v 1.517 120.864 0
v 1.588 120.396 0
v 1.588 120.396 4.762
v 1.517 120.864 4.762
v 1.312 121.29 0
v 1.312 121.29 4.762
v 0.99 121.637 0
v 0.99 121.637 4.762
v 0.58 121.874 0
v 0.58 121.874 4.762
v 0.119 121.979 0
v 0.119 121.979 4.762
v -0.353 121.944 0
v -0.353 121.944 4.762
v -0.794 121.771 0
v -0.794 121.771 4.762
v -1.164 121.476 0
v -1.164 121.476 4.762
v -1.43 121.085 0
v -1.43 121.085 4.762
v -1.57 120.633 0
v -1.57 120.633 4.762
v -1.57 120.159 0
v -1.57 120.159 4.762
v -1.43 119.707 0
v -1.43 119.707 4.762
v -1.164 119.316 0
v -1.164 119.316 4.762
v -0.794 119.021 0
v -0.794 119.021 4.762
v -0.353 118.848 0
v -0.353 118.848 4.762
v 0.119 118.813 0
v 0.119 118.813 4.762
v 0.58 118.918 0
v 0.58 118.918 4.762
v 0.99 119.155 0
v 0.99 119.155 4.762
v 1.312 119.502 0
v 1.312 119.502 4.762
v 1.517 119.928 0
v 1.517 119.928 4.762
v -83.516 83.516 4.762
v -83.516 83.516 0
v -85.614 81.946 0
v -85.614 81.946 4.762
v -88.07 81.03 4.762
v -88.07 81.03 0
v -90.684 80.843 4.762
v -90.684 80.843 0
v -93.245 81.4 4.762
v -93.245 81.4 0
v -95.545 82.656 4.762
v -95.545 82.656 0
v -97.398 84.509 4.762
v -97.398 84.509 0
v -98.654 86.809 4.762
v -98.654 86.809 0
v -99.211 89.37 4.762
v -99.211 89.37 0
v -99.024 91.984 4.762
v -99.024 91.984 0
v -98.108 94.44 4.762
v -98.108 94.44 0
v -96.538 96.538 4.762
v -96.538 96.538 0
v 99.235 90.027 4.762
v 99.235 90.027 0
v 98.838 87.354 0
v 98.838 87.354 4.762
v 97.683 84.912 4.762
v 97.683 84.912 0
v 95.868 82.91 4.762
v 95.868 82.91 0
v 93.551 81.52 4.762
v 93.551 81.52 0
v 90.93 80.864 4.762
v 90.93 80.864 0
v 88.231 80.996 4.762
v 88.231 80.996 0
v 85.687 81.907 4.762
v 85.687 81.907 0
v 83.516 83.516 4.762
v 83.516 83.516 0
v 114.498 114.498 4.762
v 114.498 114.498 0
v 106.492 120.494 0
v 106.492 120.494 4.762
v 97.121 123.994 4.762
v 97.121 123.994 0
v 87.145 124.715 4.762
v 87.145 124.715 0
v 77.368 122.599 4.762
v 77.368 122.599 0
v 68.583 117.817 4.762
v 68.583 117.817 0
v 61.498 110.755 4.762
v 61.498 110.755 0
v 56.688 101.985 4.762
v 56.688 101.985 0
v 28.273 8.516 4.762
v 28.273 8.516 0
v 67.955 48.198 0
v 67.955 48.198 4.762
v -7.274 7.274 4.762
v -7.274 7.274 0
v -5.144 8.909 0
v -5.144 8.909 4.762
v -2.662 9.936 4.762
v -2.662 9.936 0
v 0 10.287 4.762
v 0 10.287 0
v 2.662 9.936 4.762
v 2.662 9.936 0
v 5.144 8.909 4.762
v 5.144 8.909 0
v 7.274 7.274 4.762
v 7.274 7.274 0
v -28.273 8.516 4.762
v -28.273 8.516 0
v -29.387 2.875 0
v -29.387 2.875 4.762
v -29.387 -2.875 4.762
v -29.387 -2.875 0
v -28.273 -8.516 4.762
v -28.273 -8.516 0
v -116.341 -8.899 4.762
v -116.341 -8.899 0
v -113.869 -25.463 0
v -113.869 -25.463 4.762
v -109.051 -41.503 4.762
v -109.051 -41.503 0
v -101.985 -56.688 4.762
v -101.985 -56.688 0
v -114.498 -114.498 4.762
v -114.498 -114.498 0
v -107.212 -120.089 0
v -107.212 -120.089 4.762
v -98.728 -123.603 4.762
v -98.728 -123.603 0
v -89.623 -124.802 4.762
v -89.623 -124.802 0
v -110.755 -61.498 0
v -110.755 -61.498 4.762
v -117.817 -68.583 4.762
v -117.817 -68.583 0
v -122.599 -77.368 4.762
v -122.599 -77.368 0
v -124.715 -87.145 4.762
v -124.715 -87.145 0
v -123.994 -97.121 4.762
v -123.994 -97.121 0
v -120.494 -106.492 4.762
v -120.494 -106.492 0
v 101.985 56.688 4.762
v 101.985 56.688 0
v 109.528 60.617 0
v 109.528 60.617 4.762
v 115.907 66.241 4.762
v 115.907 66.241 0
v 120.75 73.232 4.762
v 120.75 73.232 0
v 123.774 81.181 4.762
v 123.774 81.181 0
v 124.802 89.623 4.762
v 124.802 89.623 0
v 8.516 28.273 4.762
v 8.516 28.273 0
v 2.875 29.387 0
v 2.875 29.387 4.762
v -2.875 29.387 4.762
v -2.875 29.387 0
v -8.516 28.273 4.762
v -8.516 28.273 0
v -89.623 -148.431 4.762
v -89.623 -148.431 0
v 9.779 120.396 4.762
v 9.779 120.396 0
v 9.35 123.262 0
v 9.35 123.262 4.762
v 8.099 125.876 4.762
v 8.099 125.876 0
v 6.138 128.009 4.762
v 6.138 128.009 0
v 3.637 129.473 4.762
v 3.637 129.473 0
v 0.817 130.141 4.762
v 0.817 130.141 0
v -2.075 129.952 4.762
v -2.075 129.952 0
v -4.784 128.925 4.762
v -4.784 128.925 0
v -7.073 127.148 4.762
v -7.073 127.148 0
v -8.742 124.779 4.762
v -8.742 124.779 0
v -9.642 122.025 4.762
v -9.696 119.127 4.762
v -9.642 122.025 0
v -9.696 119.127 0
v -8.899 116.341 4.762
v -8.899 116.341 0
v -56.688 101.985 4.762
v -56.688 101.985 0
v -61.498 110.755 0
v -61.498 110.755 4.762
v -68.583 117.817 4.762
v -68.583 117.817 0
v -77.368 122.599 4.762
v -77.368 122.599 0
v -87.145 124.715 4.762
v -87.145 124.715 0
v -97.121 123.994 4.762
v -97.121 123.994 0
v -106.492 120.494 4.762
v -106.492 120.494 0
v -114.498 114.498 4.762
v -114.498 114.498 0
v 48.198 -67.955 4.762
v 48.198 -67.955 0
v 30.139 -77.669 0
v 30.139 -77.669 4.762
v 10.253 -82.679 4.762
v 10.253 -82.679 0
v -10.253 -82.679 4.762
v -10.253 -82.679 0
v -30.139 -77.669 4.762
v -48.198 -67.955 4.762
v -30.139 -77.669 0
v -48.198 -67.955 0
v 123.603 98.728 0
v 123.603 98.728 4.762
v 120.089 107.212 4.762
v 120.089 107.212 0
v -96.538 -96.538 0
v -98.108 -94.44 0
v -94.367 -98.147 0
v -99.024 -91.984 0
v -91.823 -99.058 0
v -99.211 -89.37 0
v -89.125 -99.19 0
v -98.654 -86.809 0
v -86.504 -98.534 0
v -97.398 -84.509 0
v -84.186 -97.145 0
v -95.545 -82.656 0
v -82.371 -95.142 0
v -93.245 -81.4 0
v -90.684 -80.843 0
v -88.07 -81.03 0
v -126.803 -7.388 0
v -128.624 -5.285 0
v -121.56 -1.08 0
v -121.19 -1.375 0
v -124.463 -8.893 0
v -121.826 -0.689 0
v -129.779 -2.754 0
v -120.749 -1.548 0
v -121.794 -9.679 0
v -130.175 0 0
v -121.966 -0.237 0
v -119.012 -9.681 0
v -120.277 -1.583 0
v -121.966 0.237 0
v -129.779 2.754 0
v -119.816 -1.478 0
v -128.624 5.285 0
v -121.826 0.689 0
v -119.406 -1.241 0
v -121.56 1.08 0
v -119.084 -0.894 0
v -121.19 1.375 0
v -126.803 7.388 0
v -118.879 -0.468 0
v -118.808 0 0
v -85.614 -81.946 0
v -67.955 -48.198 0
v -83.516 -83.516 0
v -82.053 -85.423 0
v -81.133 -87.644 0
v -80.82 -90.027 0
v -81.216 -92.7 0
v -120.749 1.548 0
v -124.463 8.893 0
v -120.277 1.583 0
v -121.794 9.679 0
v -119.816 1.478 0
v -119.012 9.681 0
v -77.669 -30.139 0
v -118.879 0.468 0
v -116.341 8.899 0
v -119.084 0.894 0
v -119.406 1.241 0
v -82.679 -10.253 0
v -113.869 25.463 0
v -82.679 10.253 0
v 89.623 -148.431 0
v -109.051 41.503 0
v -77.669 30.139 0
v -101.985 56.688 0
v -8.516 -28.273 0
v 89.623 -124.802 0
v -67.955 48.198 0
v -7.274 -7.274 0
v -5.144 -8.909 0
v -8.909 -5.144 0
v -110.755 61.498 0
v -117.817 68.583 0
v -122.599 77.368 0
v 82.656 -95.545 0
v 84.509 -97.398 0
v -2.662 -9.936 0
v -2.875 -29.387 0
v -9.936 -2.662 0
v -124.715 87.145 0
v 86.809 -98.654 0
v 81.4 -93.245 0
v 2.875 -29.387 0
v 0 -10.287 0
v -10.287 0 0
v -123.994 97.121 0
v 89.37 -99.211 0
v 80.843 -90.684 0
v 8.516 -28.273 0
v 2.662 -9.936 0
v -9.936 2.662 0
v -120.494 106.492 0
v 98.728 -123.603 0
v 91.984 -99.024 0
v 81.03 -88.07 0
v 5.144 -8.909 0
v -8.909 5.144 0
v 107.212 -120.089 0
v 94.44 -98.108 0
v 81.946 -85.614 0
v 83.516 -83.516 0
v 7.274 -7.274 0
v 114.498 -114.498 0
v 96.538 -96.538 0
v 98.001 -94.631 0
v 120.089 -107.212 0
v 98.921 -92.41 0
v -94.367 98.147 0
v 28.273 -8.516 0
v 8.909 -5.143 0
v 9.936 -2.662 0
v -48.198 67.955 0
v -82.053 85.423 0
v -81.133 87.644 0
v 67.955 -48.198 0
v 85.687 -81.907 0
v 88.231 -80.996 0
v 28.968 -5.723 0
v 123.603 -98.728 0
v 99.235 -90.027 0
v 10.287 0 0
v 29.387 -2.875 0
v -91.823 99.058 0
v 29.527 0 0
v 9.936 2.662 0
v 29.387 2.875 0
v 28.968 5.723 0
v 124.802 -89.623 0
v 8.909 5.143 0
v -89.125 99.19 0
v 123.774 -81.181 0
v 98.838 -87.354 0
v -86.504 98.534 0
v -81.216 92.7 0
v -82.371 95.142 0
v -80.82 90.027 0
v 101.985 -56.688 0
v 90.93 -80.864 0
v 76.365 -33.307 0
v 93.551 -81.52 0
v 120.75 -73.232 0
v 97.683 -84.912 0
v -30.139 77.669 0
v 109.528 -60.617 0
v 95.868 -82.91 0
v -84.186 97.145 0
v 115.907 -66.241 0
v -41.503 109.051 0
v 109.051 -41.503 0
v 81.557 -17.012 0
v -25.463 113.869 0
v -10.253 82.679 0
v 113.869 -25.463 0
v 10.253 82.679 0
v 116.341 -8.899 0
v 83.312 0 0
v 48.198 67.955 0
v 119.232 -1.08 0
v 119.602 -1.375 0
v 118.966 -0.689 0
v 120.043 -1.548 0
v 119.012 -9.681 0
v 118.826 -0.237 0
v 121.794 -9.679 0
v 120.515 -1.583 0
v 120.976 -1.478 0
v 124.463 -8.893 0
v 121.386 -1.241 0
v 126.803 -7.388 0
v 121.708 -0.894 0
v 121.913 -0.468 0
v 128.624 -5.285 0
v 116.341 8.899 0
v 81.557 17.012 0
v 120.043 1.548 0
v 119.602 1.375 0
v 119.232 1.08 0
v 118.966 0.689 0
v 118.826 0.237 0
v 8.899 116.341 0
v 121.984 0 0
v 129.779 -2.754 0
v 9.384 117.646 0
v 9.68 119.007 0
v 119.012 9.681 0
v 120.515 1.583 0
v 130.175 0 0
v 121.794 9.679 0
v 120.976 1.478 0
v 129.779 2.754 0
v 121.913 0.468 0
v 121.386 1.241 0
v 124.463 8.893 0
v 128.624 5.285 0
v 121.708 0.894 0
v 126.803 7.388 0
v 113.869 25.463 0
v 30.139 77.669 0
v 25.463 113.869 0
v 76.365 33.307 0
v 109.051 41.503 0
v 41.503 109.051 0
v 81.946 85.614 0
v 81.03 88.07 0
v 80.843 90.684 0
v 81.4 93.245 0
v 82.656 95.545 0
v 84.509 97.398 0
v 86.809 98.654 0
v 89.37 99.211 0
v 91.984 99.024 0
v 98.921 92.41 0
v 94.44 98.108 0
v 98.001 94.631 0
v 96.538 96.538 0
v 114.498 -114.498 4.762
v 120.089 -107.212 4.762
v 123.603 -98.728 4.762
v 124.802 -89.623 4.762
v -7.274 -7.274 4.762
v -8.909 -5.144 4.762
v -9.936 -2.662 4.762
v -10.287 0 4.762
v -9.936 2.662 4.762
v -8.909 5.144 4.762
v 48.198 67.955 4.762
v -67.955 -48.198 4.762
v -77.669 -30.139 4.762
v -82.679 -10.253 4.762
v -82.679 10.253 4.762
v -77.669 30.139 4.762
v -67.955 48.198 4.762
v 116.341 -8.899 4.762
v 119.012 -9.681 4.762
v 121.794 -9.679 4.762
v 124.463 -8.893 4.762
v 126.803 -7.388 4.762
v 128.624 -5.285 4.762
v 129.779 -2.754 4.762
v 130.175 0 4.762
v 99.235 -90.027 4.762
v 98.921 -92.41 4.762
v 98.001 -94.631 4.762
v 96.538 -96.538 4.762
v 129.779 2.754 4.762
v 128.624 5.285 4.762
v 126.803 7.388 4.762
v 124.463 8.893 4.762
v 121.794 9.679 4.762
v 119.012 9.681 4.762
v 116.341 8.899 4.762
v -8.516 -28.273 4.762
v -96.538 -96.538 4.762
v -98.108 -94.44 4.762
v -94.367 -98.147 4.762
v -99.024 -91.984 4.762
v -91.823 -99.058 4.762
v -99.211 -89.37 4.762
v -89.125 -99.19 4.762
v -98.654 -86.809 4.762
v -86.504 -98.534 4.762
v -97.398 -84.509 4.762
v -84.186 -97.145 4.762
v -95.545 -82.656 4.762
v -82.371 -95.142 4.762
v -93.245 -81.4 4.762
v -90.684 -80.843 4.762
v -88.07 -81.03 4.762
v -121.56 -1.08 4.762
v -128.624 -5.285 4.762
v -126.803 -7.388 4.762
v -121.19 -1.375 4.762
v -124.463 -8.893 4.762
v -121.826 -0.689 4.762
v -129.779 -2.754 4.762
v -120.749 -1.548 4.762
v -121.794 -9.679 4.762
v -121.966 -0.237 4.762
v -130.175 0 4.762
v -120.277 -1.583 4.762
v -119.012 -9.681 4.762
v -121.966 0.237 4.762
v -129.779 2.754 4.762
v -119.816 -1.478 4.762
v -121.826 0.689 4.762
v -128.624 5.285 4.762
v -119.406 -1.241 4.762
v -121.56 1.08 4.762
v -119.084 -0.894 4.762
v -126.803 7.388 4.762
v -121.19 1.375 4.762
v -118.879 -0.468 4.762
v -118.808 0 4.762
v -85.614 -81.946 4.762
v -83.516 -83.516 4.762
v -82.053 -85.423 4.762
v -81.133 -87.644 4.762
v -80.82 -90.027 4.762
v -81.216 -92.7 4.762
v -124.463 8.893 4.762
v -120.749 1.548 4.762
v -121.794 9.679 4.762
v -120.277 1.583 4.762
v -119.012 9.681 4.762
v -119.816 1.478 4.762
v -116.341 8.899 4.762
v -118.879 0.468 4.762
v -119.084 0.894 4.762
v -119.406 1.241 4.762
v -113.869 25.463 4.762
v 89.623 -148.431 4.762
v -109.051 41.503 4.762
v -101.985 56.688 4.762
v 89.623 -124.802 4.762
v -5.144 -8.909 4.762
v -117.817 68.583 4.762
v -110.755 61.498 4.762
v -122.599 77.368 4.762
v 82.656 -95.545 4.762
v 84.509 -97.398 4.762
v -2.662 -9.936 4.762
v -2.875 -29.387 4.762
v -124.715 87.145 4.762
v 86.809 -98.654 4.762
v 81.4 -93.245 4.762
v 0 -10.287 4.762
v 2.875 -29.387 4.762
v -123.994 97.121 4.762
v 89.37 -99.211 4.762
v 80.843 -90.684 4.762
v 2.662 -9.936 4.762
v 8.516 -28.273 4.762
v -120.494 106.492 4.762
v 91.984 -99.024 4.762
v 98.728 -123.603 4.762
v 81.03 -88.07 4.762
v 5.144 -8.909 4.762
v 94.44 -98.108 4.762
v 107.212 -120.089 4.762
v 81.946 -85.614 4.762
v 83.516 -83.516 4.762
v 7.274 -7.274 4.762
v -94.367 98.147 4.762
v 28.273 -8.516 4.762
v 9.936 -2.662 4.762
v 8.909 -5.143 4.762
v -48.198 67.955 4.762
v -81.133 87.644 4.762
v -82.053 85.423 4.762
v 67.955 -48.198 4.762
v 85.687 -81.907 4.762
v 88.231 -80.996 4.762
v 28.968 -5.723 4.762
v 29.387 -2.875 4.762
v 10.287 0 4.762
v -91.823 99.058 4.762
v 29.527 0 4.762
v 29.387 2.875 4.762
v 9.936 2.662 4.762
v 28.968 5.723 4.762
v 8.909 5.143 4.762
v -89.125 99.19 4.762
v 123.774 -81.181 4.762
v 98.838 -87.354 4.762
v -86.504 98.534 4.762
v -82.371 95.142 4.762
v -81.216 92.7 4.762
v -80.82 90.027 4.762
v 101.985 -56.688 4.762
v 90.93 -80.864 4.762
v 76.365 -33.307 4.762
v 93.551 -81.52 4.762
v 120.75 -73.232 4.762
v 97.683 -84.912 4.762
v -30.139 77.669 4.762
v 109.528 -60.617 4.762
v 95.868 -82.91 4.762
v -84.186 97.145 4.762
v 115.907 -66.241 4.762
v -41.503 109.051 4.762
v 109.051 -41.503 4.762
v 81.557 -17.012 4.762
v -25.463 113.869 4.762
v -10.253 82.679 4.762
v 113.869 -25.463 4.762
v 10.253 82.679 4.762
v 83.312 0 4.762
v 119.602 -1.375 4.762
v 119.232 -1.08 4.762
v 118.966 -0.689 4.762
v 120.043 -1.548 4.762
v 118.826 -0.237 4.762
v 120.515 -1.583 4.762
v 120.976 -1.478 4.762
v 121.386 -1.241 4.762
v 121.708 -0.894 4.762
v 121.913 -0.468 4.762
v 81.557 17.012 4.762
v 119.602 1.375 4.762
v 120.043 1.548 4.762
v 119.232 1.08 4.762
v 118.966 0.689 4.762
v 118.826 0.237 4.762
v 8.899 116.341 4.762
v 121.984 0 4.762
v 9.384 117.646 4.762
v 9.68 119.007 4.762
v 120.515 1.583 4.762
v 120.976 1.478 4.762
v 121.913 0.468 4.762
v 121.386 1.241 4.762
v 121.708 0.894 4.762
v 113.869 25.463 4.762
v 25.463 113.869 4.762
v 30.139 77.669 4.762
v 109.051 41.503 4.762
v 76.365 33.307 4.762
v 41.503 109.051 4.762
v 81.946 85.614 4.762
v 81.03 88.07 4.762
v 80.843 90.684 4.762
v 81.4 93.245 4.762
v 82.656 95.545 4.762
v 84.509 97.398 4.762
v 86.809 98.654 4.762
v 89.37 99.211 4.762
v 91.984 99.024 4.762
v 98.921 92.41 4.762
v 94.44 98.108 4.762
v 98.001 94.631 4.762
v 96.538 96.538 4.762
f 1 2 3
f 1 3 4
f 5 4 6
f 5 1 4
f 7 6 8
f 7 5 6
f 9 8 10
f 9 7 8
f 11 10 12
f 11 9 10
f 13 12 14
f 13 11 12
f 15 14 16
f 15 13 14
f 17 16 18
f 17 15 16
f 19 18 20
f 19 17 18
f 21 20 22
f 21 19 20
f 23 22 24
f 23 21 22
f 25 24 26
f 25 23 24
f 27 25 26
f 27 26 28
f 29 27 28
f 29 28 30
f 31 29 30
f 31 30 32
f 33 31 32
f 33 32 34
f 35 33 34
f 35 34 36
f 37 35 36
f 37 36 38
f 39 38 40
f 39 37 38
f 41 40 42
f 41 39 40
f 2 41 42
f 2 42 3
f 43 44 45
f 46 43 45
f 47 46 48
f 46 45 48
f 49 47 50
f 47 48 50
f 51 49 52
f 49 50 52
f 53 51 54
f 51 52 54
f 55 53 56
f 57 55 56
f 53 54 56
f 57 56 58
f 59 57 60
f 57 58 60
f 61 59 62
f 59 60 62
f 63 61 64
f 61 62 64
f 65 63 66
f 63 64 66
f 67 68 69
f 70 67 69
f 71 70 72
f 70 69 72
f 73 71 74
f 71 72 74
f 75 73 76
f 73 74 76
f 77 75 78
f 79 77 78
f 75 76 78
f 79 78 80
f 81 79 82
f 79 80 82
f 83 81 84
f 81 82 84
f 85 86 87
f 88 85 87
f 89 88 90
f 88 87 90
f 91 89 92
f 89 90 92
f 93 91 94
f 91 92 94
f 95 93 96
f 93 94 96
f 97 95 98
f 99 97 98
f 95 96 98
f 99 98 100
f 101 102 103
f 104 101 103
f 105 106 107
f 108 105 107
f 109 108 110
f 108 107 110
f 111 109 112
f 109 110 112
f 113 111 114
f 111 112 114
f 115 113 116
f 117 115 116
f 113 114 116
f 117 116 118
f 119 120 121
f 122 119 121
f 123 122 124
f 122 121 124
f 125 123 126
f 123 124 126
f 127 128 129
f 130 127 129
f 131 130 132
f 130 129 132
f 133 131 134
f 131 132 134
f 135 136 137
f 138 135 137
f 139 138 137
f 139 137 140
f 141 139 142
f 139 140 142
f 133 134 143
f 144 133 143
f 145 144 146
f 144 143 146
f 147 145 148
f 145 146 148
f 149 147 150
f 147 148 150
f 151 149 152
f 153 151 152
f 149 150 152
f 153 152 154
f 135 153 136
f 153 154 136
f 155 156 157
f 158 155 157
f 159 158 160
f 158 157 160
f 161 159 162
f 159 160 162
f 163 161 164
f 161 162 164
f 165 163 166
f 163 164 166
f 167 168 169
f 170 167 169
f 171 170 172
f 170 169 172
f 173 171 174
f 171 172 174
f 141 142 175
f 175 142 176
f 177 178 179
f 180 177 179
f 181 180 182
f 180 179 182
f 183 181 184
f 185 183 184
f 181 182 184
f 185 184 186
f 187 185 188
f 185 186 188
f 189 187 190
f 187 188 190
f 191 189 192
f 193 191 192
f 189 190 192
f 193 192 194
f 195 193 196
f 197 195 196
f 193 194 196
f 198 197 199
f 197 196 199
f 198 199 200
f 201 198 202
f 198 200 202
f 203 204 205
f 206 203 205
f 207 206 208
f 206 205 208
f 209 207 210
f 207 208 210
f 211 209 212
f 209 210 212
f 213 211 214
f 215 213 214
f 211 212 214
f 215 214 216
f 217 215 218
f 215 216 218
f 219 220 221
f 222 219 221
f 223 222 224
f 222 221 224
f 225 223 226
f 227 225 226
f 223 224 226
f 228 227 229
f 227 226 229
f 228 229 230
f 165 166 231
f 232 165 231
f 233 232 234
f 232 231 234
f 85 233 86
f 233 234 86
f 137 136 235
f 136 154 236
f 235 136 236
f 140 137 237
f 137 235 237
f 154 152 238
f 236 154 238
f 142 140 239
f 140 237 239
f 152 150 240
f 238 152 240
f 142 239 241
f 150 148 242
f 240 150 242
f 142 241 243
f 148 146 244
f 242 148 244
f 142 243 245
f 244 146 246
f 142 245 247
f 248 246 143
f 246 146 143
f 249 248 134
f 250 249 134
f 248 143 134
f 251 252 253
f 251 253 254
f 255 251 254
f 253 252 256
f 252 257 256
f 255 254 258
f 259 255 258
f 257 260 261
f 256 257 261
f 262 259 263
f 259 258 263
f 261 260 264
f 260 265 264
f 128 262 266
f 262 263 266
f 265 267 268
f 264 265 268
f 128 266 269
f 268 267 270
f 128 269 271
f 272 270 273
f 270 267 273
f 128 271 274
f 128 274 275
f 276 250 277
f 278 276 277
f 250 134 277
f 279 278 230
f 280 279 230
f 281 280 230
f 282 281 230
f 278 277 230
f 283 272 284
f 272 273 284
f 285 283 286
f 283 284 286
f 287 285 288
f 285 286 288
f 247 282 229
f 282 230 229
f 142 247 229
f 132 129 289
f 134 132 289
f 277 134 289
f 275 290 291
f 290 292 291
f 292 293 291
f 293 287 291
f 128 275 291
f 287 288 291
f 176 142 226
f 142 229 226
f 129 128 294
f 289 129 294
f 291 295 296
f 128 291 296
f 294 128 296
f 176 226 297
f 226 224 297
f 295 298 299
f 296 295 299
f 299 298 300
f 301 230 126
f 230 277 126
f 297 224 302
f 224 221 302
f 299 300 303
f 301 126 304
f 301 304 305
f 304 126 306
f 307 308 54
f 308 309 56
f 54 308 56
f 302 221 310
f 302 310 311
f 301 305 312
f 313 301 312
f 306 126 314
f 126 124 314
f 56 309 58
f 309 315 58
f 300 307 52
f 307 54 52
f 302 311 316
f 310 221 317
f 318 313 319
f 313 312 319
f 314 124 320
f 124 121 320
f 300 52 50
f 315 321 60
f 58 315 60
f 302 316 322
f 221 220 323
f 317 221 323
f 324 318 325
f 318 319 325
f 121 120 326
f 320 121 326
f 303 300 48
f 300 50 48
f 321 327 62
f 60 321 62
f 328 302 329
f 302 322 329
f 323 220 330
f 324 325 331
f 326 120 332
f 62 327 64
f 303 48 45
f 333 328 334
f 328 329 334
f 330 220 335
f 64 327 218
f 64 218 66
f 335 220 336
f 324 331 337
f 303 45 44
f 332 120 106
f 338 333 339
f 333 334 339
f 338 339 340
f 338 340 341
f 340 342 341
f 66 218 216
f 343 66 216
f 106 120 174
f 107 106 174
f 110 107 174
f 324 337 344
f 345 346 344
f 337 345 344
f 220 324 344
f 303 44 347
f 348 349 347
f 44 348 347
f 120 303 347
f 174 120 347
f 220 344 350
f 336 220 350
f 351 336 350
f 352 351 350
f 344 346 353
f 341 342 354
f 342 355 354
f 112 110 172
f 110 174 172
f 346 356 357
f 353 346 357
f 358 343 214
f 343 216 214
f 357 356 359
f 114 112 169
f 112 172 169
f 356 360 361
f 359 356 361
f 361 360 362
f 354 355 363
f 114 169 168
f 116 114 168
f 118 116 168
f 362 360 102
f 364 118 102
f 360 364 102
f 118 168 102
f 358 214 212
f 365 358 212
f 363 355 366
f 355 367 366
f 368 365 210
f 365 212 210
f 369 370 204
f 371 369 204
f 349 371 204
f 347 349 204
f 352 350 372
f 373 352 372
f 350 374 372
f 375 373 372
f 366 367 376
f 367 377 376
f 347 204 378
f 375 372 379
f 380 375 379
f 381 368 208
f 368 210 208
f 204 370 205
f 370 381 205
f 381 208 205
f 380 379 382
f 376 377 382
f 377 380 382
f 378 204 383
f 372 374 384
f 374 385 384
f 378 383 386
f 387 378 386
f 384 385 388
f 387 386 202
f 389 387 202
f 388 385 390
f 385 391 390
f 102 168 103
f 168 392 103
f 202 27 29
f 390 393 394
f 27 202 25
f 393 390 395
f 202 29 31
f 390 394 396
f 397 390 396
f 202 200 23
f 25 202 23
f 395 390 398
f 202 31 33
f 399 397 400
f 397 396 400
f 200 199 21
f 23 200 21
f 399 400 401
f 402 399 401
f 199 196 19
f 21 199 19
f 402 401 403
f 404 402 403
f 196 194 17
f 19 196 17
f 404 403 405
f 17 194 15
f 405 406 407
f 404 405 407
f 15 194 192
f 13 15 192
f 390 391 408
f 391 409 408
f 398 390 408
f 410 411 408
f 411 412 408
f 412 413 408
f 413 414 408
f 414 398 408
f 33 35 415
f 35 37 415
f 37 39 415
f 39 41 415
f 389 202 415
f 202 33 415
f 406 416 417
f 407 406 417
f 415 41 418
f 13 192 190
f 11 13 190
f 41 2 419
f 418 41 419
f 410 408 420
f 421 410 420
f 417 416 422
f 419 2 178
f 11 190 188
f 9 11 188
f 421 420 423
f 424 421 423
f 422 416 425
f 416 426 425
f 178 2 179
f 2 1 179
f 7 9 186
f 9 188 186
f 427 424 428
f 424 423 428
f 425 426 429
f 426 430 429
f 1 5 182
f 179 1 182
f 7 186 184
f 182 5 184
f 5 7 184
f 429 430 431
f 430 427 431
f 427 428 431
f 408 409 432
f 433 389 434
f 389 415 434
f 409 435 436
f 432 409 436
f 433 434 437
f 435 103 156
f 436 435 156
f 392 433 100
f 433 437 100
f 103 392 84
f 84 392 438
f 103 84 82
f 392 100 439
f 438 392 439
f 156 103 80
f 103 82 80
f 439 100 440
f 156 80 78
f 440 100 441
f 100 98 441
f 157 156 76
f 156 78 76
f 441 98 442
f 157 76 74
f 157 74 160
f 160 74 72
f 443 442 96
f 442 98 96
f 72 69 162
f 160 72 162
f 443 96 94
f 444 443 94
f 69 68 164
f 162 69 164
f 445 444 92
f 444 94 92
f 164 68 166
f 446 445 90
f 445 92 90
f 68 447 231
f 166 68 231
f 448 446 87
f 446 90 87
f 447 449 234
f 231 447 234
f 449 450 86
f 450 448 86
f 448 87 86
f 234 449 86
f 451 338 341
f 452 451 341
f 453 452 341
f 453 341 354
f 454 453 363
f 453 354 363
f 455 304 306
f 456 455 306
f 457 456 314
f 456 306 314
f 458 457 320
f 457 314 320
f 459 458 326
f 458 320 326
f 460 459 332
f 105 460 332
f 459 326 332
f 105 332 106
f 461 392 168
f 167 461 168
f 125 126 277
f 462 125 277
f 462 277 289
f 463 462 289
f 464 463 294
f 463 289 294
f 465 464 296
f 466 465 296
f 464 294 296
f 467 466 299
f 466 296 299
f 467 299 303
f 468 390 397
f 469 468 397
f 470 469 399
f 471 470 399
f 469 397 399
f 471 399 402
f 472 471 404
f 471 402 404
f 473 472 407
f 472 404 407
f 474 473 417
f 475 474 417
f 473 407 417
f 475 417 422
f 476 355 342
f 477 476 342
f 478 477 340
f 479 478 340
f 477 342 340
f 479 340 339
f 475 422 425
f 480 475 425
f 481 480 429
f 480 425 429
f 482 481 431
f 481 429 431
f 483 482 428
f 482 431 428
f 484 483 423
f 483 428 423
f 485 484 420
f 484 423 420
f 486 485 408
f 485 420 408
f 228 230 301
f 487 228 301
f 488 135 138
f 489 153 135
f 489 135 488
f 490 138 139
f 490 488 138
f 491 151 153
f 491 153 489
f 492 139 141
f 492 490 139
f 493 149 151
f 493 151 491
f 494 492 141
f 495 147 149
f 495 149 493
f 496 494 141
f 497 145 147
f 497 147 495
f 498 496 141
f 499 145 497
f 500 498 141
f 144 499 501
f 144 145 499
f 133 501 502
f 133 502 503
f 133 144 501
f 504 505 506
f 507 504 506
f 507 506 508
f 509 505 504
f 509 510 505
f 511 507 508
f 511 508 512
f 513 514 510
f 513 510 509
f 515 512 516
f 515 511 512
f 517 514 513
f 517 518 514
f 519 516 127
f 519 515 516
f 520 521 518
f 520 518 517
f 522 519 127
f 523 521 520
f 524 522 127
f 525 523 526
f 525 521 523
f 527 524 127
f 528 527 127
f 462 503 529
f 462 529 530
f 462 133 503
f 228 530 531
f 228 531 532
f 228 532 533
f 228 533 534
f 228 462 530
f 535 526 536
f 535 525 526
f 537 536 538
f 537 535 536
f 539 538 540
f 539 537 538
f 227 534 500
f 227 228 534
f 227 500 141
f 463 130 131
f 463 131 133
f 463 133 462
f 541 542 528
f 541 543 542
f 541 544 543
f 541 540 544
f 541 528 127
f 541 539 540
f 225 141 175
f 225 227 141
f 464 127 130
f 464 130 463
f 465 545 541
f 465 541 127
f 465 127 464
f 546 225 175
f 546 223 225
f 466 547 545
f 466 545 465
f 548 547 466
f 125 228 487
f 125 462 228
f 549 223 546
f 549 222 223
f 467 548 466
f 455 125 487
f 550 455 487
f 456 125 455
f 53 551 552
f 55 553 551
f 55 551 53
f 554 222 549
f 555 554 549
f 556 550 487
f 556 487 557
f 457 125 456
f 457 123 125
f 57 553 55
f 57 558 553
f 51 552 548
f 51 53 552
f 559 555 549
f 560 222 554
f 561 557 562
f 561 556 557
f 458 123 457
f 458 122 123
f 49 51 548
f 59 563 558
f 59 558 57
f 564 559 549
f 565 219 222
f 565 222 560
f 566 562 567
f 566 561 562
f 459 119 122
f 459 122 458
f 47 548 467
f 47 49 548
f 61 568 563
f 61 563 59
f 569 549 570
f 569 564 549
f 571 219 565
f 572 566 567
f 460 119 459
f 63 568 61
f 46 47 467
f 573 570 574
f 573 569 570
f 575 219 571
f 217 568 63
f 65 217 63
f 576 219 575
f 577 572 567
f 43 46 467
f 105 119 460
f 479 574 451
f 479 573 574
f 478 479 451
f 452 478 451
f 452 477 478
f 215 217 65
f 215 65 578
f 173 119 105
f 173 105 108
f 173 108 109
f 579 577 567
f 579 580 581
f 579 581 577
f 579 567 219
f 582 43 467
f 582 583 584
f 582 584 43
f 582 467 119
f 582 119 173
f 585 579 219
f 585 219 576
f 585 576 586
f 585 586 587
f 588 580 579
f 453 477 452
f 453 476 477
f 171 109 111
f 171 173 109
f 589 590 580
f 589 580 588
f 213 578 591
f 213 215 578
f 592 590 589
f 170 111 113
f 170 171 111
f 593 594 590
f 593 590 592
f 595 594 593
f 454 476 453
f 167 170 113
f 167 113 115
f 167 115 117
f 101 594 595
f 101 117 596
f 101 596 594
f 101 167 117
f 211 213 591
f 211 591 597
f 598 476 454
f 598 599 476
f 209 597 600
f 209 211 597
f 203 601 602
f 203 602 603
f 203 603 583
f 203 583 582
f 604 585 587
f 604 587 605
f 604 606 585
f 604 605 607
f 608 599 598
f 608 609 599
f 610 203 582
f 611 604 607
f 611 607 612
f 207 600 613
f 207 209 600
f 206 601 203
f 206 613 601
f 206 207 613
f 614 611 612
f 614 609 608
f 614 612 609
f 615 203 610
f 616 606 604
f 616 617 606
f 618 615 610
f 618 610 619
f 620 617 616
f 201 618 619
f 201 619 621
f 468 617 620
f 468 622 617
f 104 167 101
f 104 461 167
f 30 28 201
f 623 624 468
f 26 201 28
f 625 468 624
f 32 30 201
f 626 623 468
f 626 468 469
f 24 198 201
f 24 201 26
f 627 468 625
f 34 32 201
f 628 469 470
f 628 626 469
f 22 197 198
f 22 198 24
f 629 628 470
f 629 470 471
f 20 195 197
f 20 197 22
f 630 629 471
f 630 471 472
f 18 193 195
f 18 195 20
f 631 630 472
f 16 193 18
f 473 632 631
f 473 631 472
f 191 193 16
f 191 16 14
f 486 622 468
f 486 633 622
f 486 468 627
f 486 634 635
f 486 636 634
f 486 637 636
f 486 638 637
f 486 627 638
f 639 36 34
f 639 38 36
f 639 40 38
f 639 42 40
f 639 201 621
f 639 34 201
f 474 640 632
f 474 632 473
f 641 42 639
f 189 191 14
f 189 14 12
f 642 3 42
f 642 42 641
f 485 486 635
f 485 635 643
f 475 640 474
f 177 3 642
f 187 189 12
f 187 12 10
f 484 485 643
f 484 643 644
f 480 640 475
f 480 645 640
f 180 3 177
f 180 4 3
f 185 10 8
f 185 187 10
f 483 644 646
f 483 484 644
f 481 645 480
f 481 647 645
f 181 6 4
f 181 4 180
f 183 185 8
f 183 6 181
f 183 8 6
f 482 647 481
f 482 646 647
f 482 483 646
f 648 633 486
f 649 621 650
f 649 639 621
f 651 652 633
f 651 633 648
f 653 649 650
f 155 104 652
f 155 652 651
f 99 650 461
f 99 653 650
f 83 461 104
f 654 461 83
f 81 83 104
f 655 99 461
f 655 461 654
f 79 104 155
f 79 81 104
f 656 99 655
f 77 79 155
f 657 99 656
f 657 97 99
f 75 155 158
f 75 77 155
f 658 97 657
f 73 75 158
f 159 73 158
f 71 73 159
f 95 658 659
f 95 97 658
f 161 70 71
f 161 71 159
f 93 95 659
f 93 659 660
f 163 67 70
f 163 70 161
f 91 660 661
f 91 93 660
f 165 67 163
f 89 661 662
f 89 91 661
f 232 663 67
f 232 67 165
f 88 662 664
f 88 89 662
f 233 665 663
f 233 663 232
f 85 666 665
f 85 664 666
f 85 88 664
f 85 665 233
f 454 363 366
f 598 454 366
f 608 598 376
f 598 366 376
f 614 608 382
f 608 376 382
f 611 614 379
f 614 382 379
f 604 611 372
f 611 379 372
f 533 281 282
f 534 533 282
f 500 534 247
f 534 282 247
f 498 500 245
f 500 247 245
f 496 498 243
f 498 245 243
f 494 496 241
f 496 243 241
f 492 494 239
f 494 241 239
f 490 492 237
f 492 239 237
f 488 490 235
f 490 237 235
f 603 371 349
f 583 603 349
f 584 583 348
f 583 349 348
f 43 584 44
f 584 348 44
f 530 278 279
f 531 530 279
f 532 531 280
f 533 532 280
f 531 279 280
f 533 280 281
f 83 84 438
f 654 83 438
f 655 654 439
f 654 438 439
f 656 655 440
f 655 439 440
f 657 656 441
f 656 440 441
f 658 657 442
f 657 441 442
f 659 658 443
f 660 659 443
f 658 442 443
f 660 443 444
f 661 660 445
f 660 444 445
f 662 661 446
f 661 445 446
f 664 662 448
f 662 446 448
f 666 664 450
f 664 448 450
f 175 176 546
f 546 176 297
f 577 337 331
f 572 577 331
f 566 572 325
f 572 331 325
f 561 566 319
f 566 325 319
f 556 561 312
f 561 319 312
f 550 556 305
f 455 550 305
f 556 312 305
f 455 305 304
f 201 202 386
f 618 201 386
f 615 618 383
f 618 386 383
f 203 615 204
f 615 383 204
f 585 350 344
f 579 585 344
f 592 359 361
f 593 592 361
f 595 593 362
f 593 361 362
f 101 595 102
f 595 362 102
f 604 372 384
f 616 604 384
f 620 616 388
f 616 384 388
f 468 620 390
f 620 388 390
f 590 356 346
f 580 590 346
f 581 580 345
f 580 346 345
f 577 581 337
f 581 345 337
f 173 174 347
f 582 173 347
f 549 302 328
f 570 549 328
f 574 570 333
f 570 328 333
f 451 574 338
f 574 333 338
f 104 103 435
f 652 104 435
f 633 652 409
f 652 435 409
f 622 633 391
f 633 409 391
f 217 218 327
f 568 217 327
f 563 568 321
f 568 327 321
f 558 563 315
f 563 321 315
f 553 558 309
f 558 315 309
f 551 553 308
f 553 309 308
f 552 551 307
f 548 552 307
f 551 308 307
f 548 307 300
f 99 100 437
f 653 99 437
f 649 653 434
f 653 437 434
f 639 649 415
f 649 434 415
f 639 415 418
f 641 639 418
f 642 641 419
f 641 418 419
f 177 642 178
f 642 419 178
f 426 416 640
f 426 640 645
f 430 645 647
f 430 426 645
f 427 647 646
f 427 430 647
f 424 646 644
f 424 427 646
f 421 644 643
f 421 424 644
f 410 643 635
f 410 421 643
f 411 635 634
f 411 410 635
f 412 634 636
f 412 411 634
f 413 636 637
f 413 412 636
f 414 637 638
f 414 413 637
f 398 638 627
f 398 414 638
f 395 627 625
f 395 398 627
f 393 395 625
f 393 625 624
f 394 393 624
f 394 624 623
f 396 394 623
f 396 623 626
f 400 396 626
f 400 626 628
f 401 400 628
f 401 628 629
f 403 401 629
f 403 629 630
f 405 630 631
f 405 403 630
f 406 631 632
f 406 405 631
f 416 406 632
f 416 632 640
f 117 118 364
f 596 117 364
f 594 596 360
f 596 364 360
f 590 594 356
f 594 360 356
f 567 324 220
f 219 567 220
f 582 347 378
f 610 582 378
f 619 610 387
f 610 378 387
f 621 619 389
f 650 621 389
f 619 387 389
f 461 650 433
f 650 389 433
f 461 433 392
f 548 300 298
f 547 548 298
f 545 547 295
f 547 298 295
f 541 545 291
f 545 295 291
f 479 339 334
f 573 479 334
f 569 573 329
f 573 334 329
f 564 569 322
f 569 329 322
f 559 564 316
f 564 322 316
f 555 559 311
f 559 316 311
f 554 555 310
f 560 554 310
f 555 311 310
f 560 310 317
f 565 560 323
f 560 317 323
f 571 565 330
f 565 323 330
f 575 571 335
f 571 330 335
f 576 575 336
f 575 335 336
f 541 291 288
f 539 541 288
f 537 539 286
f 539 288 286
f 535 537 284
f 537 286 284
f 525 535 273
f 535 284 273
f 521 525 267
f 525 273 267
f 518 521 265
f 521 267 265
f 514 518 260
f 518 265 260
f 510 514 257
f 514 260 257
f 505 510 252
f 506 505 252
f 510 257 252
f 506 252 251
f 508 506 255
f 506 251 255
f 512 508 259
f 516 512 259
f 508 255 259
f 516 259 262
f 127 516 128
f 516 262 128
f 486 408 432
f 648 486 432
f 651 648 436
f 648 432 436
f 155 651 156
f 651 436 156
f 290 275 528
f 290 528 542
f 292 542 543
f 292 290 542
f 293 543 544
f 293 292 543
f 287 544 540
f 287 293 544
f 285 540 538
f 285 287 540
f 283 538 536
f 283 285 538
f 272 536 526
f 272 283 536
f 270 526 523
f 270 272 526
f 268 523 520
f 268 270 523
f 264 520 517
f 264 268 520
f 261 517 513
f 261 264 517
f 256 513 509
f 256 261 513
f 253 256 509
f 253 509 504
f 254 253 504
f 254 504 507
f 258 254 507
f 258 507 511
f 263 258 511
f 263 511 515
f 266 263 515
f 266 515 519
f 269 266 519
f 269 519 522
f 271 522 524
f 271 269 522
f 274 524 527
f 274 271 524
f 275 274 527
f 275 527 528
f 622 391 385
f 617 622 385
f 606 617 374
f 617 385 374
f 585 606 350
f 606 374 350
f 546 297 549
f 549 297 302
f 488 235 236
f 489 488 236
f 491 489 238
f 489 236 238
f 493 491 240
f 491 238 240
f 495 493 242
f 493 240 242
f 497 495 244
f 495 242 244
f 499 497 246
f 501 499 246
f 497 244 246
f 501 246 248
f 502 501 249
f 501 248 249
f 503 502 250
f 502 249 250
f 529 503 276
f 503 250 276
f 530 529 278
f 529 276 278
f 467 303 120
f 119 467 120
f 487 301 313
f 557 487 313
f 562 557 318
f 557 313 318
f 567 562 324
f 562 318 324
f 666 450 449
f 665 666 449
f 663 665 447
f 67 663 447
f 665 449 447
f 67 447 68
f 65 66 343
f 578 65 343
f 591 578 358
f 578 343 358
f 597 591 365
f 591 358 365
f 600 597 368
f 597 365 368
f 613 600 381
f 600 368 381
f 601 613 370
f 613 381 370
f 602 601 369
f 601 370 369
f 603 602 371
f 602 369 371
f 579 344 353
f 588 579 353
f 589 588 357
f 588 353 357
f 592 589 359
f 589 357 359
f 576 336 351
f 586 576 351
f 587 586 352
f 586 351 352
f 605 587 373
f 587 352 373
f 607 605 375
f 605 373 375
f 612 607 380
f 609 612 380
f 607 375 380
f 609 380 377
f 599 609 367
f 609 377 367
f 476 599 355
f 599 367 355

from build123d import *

# Parameters (mm, degrees)
F0_R     = 1.5875
F1_DEPTH = 4.7625


# Not quite as in the source:
# - a length typed as a fraction of an inch, garbled in the dataset ("3 / 203.2 mm" for 3/8 in), is restored


with BuildPart() as f1:
    # F0 (on Top) → F1 (new body)
    with BuildSketch(Plane.XY):
        with BuildLine():
            ThreePointArc((-101.9853941355, 56.6876837116), (-93.1446500572, 70.2750899486), (-82.5061031123, 82.5061031123))
            Line((-82.5061031123, 82.5061031123), (-83.5163819259, 83.5163819259))
            ThreePointArc((-83.5163819259, 83.5163819259), (-96.5377533015, 83.5163819259), (-96.5377533015, 96.5377533015))
            Line((-96.5377533015, 96.5377533015), (-114.4982655436, 114.4982655436))
            ThreePointArc((-114.4982655436, 114.4982655436), (-124.0057759655, 82.180930941), (-101.9853941355, 56.6876837116))
        make_face()
        with BuildLine():
            ThreePointArc((-82.5061031123, 82.5061031123), (-70.2750899486, 93.1446500572), (-56.6876837116, 101.9853941355))
            ThreePointArc((-56.6876837116, 101.9853941355), (-82.180930941, 124.0057759655), (-114.4982655436, 114.4982655436))
            Line((-114.4982655436, 114.4982655436), (-96.5377533015, 96.5377533015))
            ThreePointArc((-96.5377533015, 96.5377533015), (-86.5035099102, 98.5336884093), (-80.8195676137, 90.0270676137))
            ThreePointArc((-80.8195676137, 90.0270676137), (-81.5204468181, 86.5035099102), (-83.5163819259, 83.5163819259))
            Line((-83.5163819259, 83.5163819259), (-82.5061031123, 82.5061031123))
        make_face()
        with BuildLine():
            ThreePointArc((-54.4439560883, 89.6229560883), (-55.0094328066, 95.9051568993), (-56.6876837116, 101.9853941355))
            ThreePointArc((-56.6876837116, 101.9853941355), (-70.2750899486, 93.1446500572), (-82.5061031123, 82.5061031123))
            Line((-82.5061031123, 82.5061031123), (-64.7476466329, 64.7476466329))
            ThreePointArc((-64.7476466329, 64.7476466329), (-57.1217980141, 76.1605356211), (-54.4439560883, 89.6229560883))
        make_face()
        with BuildLine():
            Line((-64.7476466329, 64.7476466329), (-82.5061031123, 82.5061031123))
            ThreePointArc((-82.5061031123, 82.5061031123), (-93.1446500572, 70.2750899486), (-101.9853941355, 56.6876837116))
            ThreePointArc((-101.9853941355, 56.6876837116), (-82.180930941, 55.2401362111), (-64.7476466329, 64.7476466329))
        make_face()
        with BuildLine():
            ThreePointArc((-67.954647167, 48.1980837006), (-63.6582986892, 53.7448634941), (-58.9104801542, 58.9104801542))
            Line((-58.9104801542, 58.9104801542), (-64.7476466329, 64.7476466329))
            ThreePointArc((-64.7476466329, 64.7476466329), (-82.180930941, 55.2401362111), (-101.9853941355, 56.6876837116))
            ThreePointArc((-101.9853941355, 56.6876837116), (-111.7478973152, 33.5696521758), (-116.3414153151, 8.8988304868))
            ThreePointArc((-116.3414153151, 8.8988304868), (-112.1716877299, 5.2905130832), (-110.617, 0))
            ThreePointArc((-110.617, 0), (-112.1716877299, -5.2905130832), (-116.3414153151, -8.8988304868))
            ThreePointArc((-116.3414153151, -8.8988304868), (-111.7478973152, -33.5696521758), (-101.9853941355, -56.6876837116))
            ThreePointArc((-101.9853941355, -56.6876837116), (-82.180930941, -55.2401362111), (-64.7476466329, -64.7476466329))
            Line((-64.7476466329, -64.7476466329), (-58.9104801542, -58.9104801542))
            ThreePointArc((-58.9104801542, -58.9104801542), (-63.6582986892, -53.7448634941), (-67.954647167, -48.1980837006))
            ThreePointArc((-67.954647167, -48.1980837006), (-83.312, 0), (-67.954647167, 48.1980837006))
        make_face()
        with BuildLine():
            Line((58.9104801542, 58.9104801542), (64.7476466329, 64.7476466329))
            ThreePointArc((64.7476466329, 64.7476466329), (55.2401362111, 82.180930941), (56.6876837116, 101.9853941355))
            ThreePointArc((56.6876837116, 101.9853941355), (33.5696521758, 111.7478973152), (8.8988304868, 116.3414153151))
            ThreePointArc((8.8988304868, 116.3414153151), (0, 110.617), (-8.8988304868, 116.3414153151))
            ThreePointArc((-8.8988304868, 116.3414153151), (-33.5696521758, 111.7478973152), (-56.6876837116, 101.9853941355))
            ThreePointArc((-56.6876837116, 101.9853941355), (-55.0094328066, 95.9051568993), (-54.4439560883, 89.6229560883))
            ThreePointArc((-54.4439560883, 89.6229560883), (-57.1217980141, 76.1605356211), (-64.7476466329, 64.7476466329))
            Line((-64.7476466329, 64.7476466329), (-58.9104801542, 58.9104801542))
            ThreePointArc((-58.9104801542, 58.9104801542), (-53.7448634941, 63.6582986892), (-48.1980837006, 67.954647167))
            ThreePointArc((-48.1980837006, 67.954647167), (0, 83.312), (48.1980837006, 67.954647167))
            ThreePointArc((48.1980837006, 67.954647167), (53.7448634941, 63.6582986892), (58.9104801542, 58.9104801542))
        make_face()
        with BuildLine():
            ThreePointArc((116.3414153151, -8.8988304868), (110.617, 0), (116.3414153151, 8.8988304868))
            ThreePointArc((116.3414153151, 8.8988304868), (111.7478973152, 33.5696521758), (101.9853941355, 56.6876837116))
            ThreePointArc((101.9853941355, 56.6876837116), (82.180930941, 55.2401362111), (64.7476466329, 64.7476466329))
            Line((64.7476466329, 64.7476466329), (58.9104801542, 58.9104801542))
            ThreePointArc((58.9104801542, 58.9104801542), (63.6582986892, 53.7448634941), (67.954647167, 48.1980837006))
            ThreePointArc((67.954647167, 48.1980837006), (79.3798680673, 25.2928031189), (83.312, 0))
            ThreePointArc((83.312, 0), (79.3798680673, -25.2928031189), (67.954647167, -48.1980837006))
            ThreePointArc((67.954647167, -48.1980837006), (63.6582986892, -53.7448634941), (58.9104801542, -58.9104801542))
            Line((58.9104801542, -58.9104801542), (64.7476466329, -64.7476466329))
            ThreePointArc((64.7476466329, -64.7476466329), (82.180930941, -55.2401362111), (101.9853941355, -56.6876837116))
            ThreePointArc((101.9853941355, -56.6876837116), (111.7478973152, -33.5696521758), (116.3414153151, -8.8988304868))
        make_face()
        with BuildLine():
            ThreePointArc((56.6876837116, -101.9853941355), (55.2401362111, -82.180930941), (64.7476466329, -64.7476466329))
            Line((64.7476466329, -64.7476466329), (58.9104801542, -58.9104801542))
            ThreePointArc((58.9104801542, -58.9104801542), (53.7448634941, -63.6582986892), (48.1980837006, -67.954647167))
            ThreePointArc((48.1980837006, -67.954647167), (0, -83.312), (-48.1980837006, -67.954647167))
            ThreePointArc((-48.1980837006, -67.954647167), (-53.7448634941, -63.6582986892), (-58.9104801542, -58.9104801542))
            Line((-58.9104801542, -58.9104801542), (-64.7476466329, -64.7476466329))
            ThreePointArc((-64.7476466329, -64.7476466329), (-57.1217980141, -76.1605356211), (-54.4439560883, -89.6229560883))
            ThreePointArc((-54.4439560883, -89.6229560883), (-55.0094328066, -95.9051568993), (-56.6876837116, -101.9853941355))
            ThreePointArc((-56.6876837116, -101.9853941355), (0, -116.68125), (56.6876837116, -101.9853941355))
        make_face()
        with BuildLine():
            ThreePointArc((-82.5061031123, -82.5061031123), (-70.2750899486, -93.1446500572), (-56.6876837116, -101.9853941355))
            ThreePointArc((-56.6876837116, -101.9853941355), (-55.0094328066, -95.9051568993), (-54.4439560883, -89.6229560883))
            ThreePointArc((-54.4439560883, -89.6229560883), (-57.1217980141, -76.1605356211), (-64.7476466329, -64.7476466329))
            Line((-64.7476466329, -64.7476466329), (-82.5061031123, -82.5061031123))
        make_face()
        with BuildLine():
            ThreePointArc((-101.9853941355, -56.6876837116), (-93.1446500572, -70.2750899486), (-82.5061031123, -82.5061031123))
            Line((-82.5061031123, -82.5061031123), (-64.7476466329, -64.7476466329))
            ThreePointArc((-64.7476466329, -64.7476466329), (-82.180930941, -55.2401362111), (-101.9853941355, -56.6876837116))
        make_face()
        with BuildLine():
            ThreePointArc((56.6876837116, -101.9853941355), (70.2750899486, -93.1446500572), (82.5061031123, -82.5061031123))
            Line((82.5061031123, -82.5061031123), (64.7476466329, -64.7476466329))
            ThreePointArc((64.7476466329, -64.7476466329), (55.2401362111, -82.180930941), (56.6876837116, -101.9853941355))
        make_face()
        with BuildLine():
            ThreePointArc((82.5061031123, -82.5061031123), (93.1446500572, -70.2750899486), (101.9853941355, -56.6876837116))
            ThreePointArc((101.9853941355, -56.6876837116), (82.180930941, -55.2401362111), (64.7476466329, -64.7476466329))
            Line((64.7476466329, -64.7476466329), (82.5061031123, -82.5061031123))
        make_face()
        with BuildLine():
            ThreePointArc((64.7476466329, 64.7476466329), (82.180930941, 55.2401362111), (101.9853941355, 56.6876837116))
            ThreePointArc((101.9853941355, 56.6876837116), (93.1446500572, 70.2750899486), (82.5061031123, 82.5061031123))
            Line((82.5061031123, 82.5061031123), (64.7476466329, 64.7476466329))
        make_face()
        with BuildLine():
            Line((64.7476466329, 64.7476466329), (82.5061031123, 82.5061031123))
            ThreePointArc((82.5061031123, 82.5061031123), (70.2750899486, 93.1446500572), (56.6876837116, 101.9853941355))
            ThreePointArc((56.6876837116, 101.9853941355), (55.2401362111, 82.180930941), (64.7476466329, 64.7476466329))
        make_face()
        with BuildLine():
            ThreePointArc((82.5061031123, 82.5061031123), (93.1446500572, 70.2750899486), (101.9853941355, 56.6876837116))
            ThreePointArc((101.9853941355, 56.6876837116), (118.5405999157, 69.5896858493), (124.8019560883, 89.6229560883))
            ThreePointArc((124.8019560883, 89.6229560883), (122.1241141625, 103.0853765554), (114.4982655436, 114.4982655436))
            Line((114.4982655436, 114.4982655436), (96.5377533015, 96.5377533015))
            ThreePointArc((96.5377533015, 96.5377533015), (98.5336884093, 93.5506253172), (99.2345676137, 90.0270676137))
            ThreePointArc((99.2345676137, 90.0270676137), (93.5506253172, 81.5204468181), (83.5163819259, 83.5163819259))
            Line((83.5163819259, 83.5163819259), (82.5061031123, 82.5061031123))
        make_face()
        with BuildLine():
            ThreePointArc((56.6876837116, 101.9853941355), (70.2750899486, 93.1446500572), (82.5061031123, 82.5061031123))
            Line((82.5061031123, 82.5061031123), (83.5163819259, 83.5163819259))
            ThreePointArc((83.5163819259, 83.5163819259), (83.5163819259, 96.5377533015), (96.5377533015, 96.5377533015))
            Line((96.5377533015, 96.5377533015), (114.4982655436, 114.4982655436))
            ThreePointArc((114.4982655436, 114.4982655436), (82.180930941, 124.0057759655), (56.6876837116, 101.9853941355))
        make_face()
        with BuildLine():
            Line((-83.5163819259, -83.5163819259), (-82.5061031123, -82.5061031123))
            ThreePointArc((-82.5061031123, -82.5061031123), (-93.1446500572, -70.2750899486), (-101.9853941355, -56.6876837116))
            ThreePointArc((-101.9853941355, -56.6876837116), (-124.0057759655, -82.180930941), (-114.4982655436, -114.4982655436))
            Line((-114.4982655436, -114.4982655436), (-96.5377533015, -96.5377533015))
            ThreePointArc((-96.5377533015, -96.5377533015), (-96.5377533015, -83.5163819259), (-83.5163819259, -83.5163819259))
        make_face()
        with BuildLine():
            ThreePointArc((-89.6229560883, -124.8019560883), (-69.5896858493, -118.5405999157), (-56.6876837116, -101.9853941355))
            ThreePointArc((-56.6876837116, -101.9853941355), (-70.2750899486, -93.1446500572), (-82.5061031123, -82.5061031123))
            Line((-82.5061031123, -82.5061031123), (-83.5163819259, -83.5163819259))
            ThreePointArc((-83.5163819259, -83.5163819259), (-81.5204468181, -86.5035099102), (-80.8195676137, -90.0270676137))
            ThreePointArc((-80.8195676137, -90.0270676137), (-86.5035099102, -98.5336884093), (-96.5377533015, -96.5377533015))
            Line((-96.5377533015, -96.5377533015), (-114.4982655436, -114.4982655436))
            ThreePointArc((-114.4982655436, -114.4982655436), (-103.0853765554, -122.1241141625), (-89.6229560883, -124.8019560883))
        make_face()
        with BuildLine():
            Line((83.5163819259, -83.5163819259), (82.5061031123, -82.5061031123))
            ThreePointArc((82.5061031123, -82.5061031123), (70.2750899486, -93.1446500572), (56.6876837116, -101.9853941355))
            ThreePointArc((56.6876837116, -101.9853941355), (69.5896858493, -118.5405999157), (89.6229560883, -124.8019560883))
            ThreePointArc((89.6229560883, -124.8019560883), (103.0853765554, -122.1241141625), (114.4982655436, -114.4982655436))
            Line((114.4982655436, -114.4982655436), (96.5377533015, -96.5377533015))
            ThreePointArc((96.5377533015, -96.5377533015), (83.5163819259, -96.5377533015), (83.5163819259, -83.5163819259))
        make_face()
        with BuildLine():
            ThreePointArc((124.8019560883, -89.6229560883), (118.5405999157, -69.5896858493), (101.9853941355, -56.6876837116))
            ThreePointArc((101.9853941355, -56.6876837116), (93.1446500572, -70.2750899486), (82.5061031123, -82.5061031123))
            Line((82.5061031123, -82.5061031123), (83.5163819259, -83.5163819259))
            ThreePointArc((83.5163819259, -83.5163819259), (93.5506253172, -81.5204468181), (99.2345676137, -90.0270676137))
            ThreePointArc((99.2345676137, -90.0270676137), (98.5336884093, -93.5506253172), (96.5377533015, -96.5377533015))
            Line((96.5377533015, -96.5377533015), (114.4982655436, -114.4982655436))
            ThreePointArc((114.4982655436, -114.4982655436), (122.1241141625, -103.0853765554), (124.8019560883, -89.6229560883))
        make_face()
        with BuildLine():
            ThreePointArc((116.3414153151, 8.8988304868), (116.5962603759, 4.4526585218), (116.68125, 0))
            ThreePointArc((116.68125, 0), (116.5962603759, -4.4526585218), (116.3414153151, -8.8988304868))
            ThreePointArc((116.3414153151, -8.8988304868), (125.6865130832, -8.2243122701), (130.175, 0))
            ThreePointArc((130.175, 0), (125.6865130832, 8.2243122701), (116.3414153151, 8.8988304868))
        make_face()
        with Locations((120.396, 0)):
            Circle(F0_R, mode=Mode.SUBTRACT)
        with BuildLine():
            ThreePointArc((116.3414153151, -8.8988304868), (116.5962603759, -4.4526585218), (116.68125, 0))
            ThreePointArc((116.68125, 0), (116.5962603759, 4.4526585218), (116.3414153151, 8.8988304868))
            ThreePointArc((116.3414153151, 8.8988304868), (110.617, 0), (116.3414153151, -8.8988304868))
        make_face()
        with BuildLine():
            ThreePointArc((-116.3414153151, 8.8988304868), (-116.68125, 0), (-116.3414153151, -8.8988304868))
            ThreePointArc((-116.3414153151, -8.8988304868), (-112.1716877299, -5.2905130832), (-110.617, 0))
            ThreePointArc((-110.617, 0), (-112.1716877299, 5.2905130832), (-116.3414153151, 8.8988304868))
        make_face()
        with BuildLine():
            ThreePointArc((-116.3414153151, 8.8988304868), (-130.175, 0), (-116.3414153151, -8.8988304868))
            ThreePointArc((-116.3414153151, -8.8988304868), (-116.68125, 0), (-116.3414153151, 8.8988304868))
        make_face()
        with Locations((-120.396, 0)):
            Circle(F0_R, mode=Mode.SUBTRACT)
        with BuildLine():
            ThreePointArc((-8.8988304868, 116.3414153151), (0, 110.617), (8.8988304868, 116.3414153151))
            ThreePointArc((8.8988304868, 116.3414153151), (0, 116.68125), (-8.8988304868, 116.3414153151))
        make_face()
        with BuildLine():
            ThreePointArc((-8.8988304868, 116.3414153151), (0, 116.68125), (8.8988304868, 116.3414153151))
            ThreePointArc((8.8988304868, 116.3414153151), (9.5564246539, 118.3214907003), (9.779, 120.396))
            ThreePointArc((9.779, 120.396), (-2.0745092997, 129.9524246539), (-8.8988304868, 116.3414153151))
        make_face()
        with Locations((0, 120.396)):
            Circle(F0_R, mode=Mode.SUBTRACT)
        with BuildLine():
            ThreePointArc((89.6229560883, -124.8019560883), (69.5896858493, -118.5405999157), (56.6876837116, -101.9853941355))
            ThreePointArc((56.6876837116, -101.9853941355), (0, -116.68125), (-56.6876837116, -101.9853941355))
            ThreePointArc((-56.6876837116, -101.9853941355), (-69.5896858493, -118.5405999157), (-89.6229560883, -124.8019560883))
            Line((-89.6229560883, -124.8019560883), (-89.6229560883, -148.43125))
            Line((-89.6229560883, -148.43125), (89.6229560883, -148.43125))
            Line((89.6229560883, -148.43125), (89.6229560883, -124.8019560883))
        make_face()
        with BuildLine():
            ThreePointArc((48.1980837006, -67.954647167), (53.7448634941, -63.6582986892), (58.9104801542, -58.9104801542))
            Line((58.9104801542, -58.9104801542), (20.8790954815, -20.8790954815))
            ThreePointArc((20.8790954815, -20.8790954815), (15.1554294108, -25.3413933245), (8.5161787951, -28.2727422614))
            Line((8.5161787951, -28.2727422614), (48.1980837006, -67.954647167))
        make_face()
        with BuildLine():
            Line((20.8790954815, -20.8790954815), (58.9104801542, -58.9104801542))
            ThreePointArc((58.9104801542, -58.9104801542), (63.6582986892, -53.7448634941), (67.954647167, -48.1980837006))
            Line((67.954647167, -48.1980837006), (28.2727422614, -8.5161787951))
            ThreePointArc((28.2727422614, -8.5161787951), (25.3413933245, -15.1554294108), (20.8790954815, -20.8790954815))
        make_face()
        with BuildLine():
            Line((9.8782817332, -9.8782817332), (20.8790954815, -20.8790954815))
            ThreePointArc((20.8790954815, -20.8790954815), (25.3413933245, -15.1554294108), (28.2727422614, -8.5161787951))
            Line((28.2727422614, -8.5161787951), (19.7565634664, 0))
            Line((19.7565634664, 0), (9.8782817332, -9.8782817332))
        make_face()
        with BuildLine():
            ThreePointArc((8.5161787951, -28.2727422614), (15.1554294108, -25.3413933245), (20.8790954815, -20.8790954815))
            Line((20.8790954815, -20.8790954815), (9.8782817332, -9.8782817332))
            Line((9.8782817332, -9.8782817332), (0, -19.7565634664))
            Line((0, -19.7565634664), (8.5161787951, -28.2727422614))
        make_face()
        with BuildLine():
            Line((-8.5161787951, -28.2727422614), (0, -19.7565634664))
            Line((0, -19.7565634664), (-9.8782817332, -9.8782817332))
            Line((-9.8782817332, -9.8782817332), (-20.8790954815, -20.8790954815))
            ThreePointArc((-20.8790954815, -20.8790954815), (-15.1554294108, -25.3413933245), (-8.5161787951, -28.2727422614))
        make_face()
        with BuildLine():
            ThreePointArc((-58.9104801542, -58.9104801542), (-53.7448634941, -63.6582986892), (-48.1980837006, -67.954647167))
            Line((-48.1980837006, -67.954647167), (-8.5161787951, -28.2727422614))
            ThreePointArc((-8.5161787951, -28.2727422614), (-15.1554294108, -25.3413933245), (-20.8790954815, -20.8790954815))
            Line((-20.8790954815, -20.8790954815), (-58.9104801542, -58.9104801542))
        make_face()
        with BuildLine():
            ThreePointArc((-67.954647167, -48.1980837006), (-63.6582986892, -53.7448634941), (-58.9104801542, -58.9104801542))
            Line((-58.9104801542, -58.9104801542), (-20.8790954815, -20.8790954815))
            ThreePointArc((-20.8790954815, -20.8790954815), (-25.3413933245, -15.1554294108), (-28.2727422614, -8.5161787951))
            Line((-28.2727422614, -8.5161787951), (-67.954647167, -48.1980837006))
        make_face()
        with BuildLine():
            ThreePointArc((-8.5161787951, -28.2727422614), (0, -29.5275), (8.5161787951, -28.2727422614))
            Line((8.5161787951, -28.2727422614), (0, -19.7565634664))
            Line((0, -19.7565634664), (-8.5161787951, -28.2727422614))
        make_face()
        with BuildLine():
            ThreePointArc((29.5275, 0), (29.2121263637, 4.3040596607), (28.2727422614, 8.5161787951))
            Line((28.2727422614, 8.5161787951), (19.7565634664, 0))
            Line((19.7565634664, 0), (28.2727422614, -8.5161787951))
            ThreePointArc((28.2727422614, -8.5161787951), (29.2121263637, -4.3040596607), (29.5275, 0))
        make_face()
        with BuildLine():
            Line((-20.8790954815, -20.8790954815), (-9.8782817332, -9.8782817332))
            Line((-9.8782817332, -9.8782817332), (-19.7565634664, 0))
            Line((-19.7565634664, 0), (-28.2727422614, -8.5161787951))
            ThreePointArc((-28.2727422614, -8.5161787951), (-25.3413933245, -15.1554294108), (-20.8790954815, -20.8790954815))
        make_face()
        with BuildLine():
            Line((-28.2727422614, -8.5161787951), (-19.7565634664, 0))
            Line((-19.7565634664, 0), (-28.2727422614, 8.5161787951))
            ThreePointArc((-28.2727422614, 8.5161787951), (-29.5275, 0), (-28.2727422614, -8.5161787951))
        make_face()
        with BuildLine():
            Line((-19.7565634664, 0), (-9.8782817332, 9.8782817332))
            Line((-9.8782817332, 9.8782817332), (-20.8790954815, 20.8790954815))
            ThreePointArc((-20.8790954815, 20.8790954815), (-25.3413933245, 15.1554294108), (-28.2727422614, 8.5161787951))
            Line((-28.2727422614, 8.5161787951), (-19.7565634664, 0))
        make_face()
        with BuildLine():
            Line((-9.8782817332, 9.8782817332), (0, 19.7565634664))
            Line((0, 19.7565634664), (-8.5161787951, 28.2727422614))
            ThreePointArc((-8.5161787951, 28.2727422614), (-15.1554294108, 25.3413933245), (-20.8790954815, 20.8790954815))
            Line((-20.8790954815, 20.8790954815), (-9.8782817332, 9.8782817332))
        make_face()
        with BuildLine():
            Line((0, 19.7565634664), (8.5161787951, 28.2727422614))
            ThreePointArc((8.5161787951, 28.2727422614), (0, 29.5275), (-8.5161787951, 28.2727422614))
            Line((-8.5161787951, 28.2727422614), (0, 19.7565634664))
        make_face()
        with BuildLine():
            Line((9.8782817332, 9.8782817332), (20.8790954815, 20.8790954815))
            ThreePointArc((20.8790954815, 20.8790954815), (15.1554294108, 25.3413933245), (8.5161787951, 28.2727422614))
            Line((8.5161787951, 28.2727422614), (0, 19.7565634664))
            Line((0, 19.7565634664), (9.8782817332, 9.8782817332))
        make_face()
        with BuildLine():
            ThreePointArc((28.2727422614, 8.5161787951), (25.3413933245, 15.1554294108), (20.8790954815, 20.8790954815))
            Line((20.8790954815, 20.8790954815), (9.8782817332, 9.8782817332))
            Line((9.8782817332, 9.8782817332), (19.7565634664, 0))
            Line((19.7565634664, 0), (28.2727422614, 8.5161787951))
        make_face()
        with BuildLine():
            Line((19.7565634664, 0), (9.8782817332, 9.8782817332))
            Line((9.8782817332, 9.8782817332), (7.2740074581, 7.2740074581))
            ThreePointArc((7.2740074581, 7.2740074581), (9.5039487509, 3.9366644687), (10.287, 0))
            ThreePointArc((10.287, 0), (9.5039487509, -3.9366644687), (7.2740074581, -7.2740074581))
            Line((7.2740074581, -7.2740074581), (9.8782817332, -9.8782817332))
            Line((9.8782817332, -9.8782817332), (19.7565634664, 0))
        make_face()
        with BuildLine():
            Line((0, -19.7565634664), (9.8782817332, -9.8782817332))
            Line((9.8782817332, -9.8782817332), (7.2740074581, -7.2740074581))
            ThreePointArc((7.2740074581, -7.2740074581), (0, -10.287), (-7.2740074581, -7.2740074581))
            Line((-7.2740074581, -7.2740074581), (-9.8782817332, -9.8782817332))
            Line((-9.8782817332, -9.8782817332), (0, -19.7565634664))
        make_face()
        with BuildLine():
            ThreePointArc((-7.2740074581, -7.2740074581), (-10.287, 0), (-7.2740074581, 7.2740074581))
            Line((-7.2740074581, 7.2740074581), (-9.8782817332, 9.8782817332))
            Line((-9.8782817332, 9.8782817332), (-19.7565634664, 0))
            Line((-19.7565634664, 0), (-9.8782817332, -9.8782817332))
            Line((-9.8782817332, -9.8782817332), (-7.2740074581, -7.2740074581))
        make_face()
        with BuildLine():
            Line((7.2740074581, 7.2740074581), (9.8782817332, 9.8782817332))
            Line((9.8782817332, 9.8782817332), (0, 19.7565634664))
            Line((0, 19.7565634664), (-9.8782817332, 9.8782817332))
            Line((-9.8782817332, 9.8782817332), (-7.2740074581, 7.2740074581))
            ThreePointArc((-7.2740074581, 7.2740074581), (0, 10.287), (7.2740074581, 7.2740074581))
        make_face()
        with BuildLine():
            ThreePointArc((67.954647167, 48.1980837006), (63.6582986892, 53.7448634941), (58.9104801542, 58.9104801542))
            Line((58.9104801542, 58.9104801542), (20.8790954815, 20.8790954815))
            ThreePointArc((20.8790954815, 20.8790954815), (25.3413933245, 15.1554294108), (28.2727422614, 8.5161787951))
            Line((28.2727422614, 8.5161787951), (67.954647167, 48.1980837006))
        make_face()
        with BuildLine():
            Line((20.8790954815, 20.8790954815), (58.9104801542, 58.9104801542))
            ThreePointArc((58.9104801542, 58.9104801542), (53.7448634941, 63.6582986892), (48.1980837006, 67.954647167))
            Line((48.1980837006, 67.954647167), (8.5161787951, 28.2727422614))
            ThreePointArc((8.5161787951, 28.2727422614), (15.1554294108, 25.3413933245), (20.8790954815, 20.8790954815))
        make_face()
        with BuildLine():
            Line((-8.5161787951, 28.2727422614), (-48.1980837006, 67.954647167))
            ThreePointArc((-48.1980837006, 67.954647167), (-53.7448634941, 63.6582986892), (-58.9104801542, 58.9104801542))
            Line((-58.9104801542, 58.9104801542), (-20.8790954815, 20.8790954815))
            ThreePointArc((-20.8790954815, 20.8790954815), (-15.1554294108, 25.3413933245), (-8.5161787951, 28.2727422614))
        make_face()
        with BuildLine():
            Line((-20.8790954815, 20.8790954815), (-58.9104801542, 58.9104801542))
            ThreePointArc((-58.9104801542, 58.9104801542), (-63.6582986892, 53.7448634941), (-67.954647167, 48.1980837006))
            Line((-67.954647167, 48.1980837006), (-28.2727422614, 8.5161787951))
            ThreePointArc((-28.2727422614, 8.5161787951), (-25.3413933245, 15.1554294108), (-20.8790954815, 20.8790954815))
        make_face()
    extrude(amount=F1_DEPTH)


solid = f1.part
